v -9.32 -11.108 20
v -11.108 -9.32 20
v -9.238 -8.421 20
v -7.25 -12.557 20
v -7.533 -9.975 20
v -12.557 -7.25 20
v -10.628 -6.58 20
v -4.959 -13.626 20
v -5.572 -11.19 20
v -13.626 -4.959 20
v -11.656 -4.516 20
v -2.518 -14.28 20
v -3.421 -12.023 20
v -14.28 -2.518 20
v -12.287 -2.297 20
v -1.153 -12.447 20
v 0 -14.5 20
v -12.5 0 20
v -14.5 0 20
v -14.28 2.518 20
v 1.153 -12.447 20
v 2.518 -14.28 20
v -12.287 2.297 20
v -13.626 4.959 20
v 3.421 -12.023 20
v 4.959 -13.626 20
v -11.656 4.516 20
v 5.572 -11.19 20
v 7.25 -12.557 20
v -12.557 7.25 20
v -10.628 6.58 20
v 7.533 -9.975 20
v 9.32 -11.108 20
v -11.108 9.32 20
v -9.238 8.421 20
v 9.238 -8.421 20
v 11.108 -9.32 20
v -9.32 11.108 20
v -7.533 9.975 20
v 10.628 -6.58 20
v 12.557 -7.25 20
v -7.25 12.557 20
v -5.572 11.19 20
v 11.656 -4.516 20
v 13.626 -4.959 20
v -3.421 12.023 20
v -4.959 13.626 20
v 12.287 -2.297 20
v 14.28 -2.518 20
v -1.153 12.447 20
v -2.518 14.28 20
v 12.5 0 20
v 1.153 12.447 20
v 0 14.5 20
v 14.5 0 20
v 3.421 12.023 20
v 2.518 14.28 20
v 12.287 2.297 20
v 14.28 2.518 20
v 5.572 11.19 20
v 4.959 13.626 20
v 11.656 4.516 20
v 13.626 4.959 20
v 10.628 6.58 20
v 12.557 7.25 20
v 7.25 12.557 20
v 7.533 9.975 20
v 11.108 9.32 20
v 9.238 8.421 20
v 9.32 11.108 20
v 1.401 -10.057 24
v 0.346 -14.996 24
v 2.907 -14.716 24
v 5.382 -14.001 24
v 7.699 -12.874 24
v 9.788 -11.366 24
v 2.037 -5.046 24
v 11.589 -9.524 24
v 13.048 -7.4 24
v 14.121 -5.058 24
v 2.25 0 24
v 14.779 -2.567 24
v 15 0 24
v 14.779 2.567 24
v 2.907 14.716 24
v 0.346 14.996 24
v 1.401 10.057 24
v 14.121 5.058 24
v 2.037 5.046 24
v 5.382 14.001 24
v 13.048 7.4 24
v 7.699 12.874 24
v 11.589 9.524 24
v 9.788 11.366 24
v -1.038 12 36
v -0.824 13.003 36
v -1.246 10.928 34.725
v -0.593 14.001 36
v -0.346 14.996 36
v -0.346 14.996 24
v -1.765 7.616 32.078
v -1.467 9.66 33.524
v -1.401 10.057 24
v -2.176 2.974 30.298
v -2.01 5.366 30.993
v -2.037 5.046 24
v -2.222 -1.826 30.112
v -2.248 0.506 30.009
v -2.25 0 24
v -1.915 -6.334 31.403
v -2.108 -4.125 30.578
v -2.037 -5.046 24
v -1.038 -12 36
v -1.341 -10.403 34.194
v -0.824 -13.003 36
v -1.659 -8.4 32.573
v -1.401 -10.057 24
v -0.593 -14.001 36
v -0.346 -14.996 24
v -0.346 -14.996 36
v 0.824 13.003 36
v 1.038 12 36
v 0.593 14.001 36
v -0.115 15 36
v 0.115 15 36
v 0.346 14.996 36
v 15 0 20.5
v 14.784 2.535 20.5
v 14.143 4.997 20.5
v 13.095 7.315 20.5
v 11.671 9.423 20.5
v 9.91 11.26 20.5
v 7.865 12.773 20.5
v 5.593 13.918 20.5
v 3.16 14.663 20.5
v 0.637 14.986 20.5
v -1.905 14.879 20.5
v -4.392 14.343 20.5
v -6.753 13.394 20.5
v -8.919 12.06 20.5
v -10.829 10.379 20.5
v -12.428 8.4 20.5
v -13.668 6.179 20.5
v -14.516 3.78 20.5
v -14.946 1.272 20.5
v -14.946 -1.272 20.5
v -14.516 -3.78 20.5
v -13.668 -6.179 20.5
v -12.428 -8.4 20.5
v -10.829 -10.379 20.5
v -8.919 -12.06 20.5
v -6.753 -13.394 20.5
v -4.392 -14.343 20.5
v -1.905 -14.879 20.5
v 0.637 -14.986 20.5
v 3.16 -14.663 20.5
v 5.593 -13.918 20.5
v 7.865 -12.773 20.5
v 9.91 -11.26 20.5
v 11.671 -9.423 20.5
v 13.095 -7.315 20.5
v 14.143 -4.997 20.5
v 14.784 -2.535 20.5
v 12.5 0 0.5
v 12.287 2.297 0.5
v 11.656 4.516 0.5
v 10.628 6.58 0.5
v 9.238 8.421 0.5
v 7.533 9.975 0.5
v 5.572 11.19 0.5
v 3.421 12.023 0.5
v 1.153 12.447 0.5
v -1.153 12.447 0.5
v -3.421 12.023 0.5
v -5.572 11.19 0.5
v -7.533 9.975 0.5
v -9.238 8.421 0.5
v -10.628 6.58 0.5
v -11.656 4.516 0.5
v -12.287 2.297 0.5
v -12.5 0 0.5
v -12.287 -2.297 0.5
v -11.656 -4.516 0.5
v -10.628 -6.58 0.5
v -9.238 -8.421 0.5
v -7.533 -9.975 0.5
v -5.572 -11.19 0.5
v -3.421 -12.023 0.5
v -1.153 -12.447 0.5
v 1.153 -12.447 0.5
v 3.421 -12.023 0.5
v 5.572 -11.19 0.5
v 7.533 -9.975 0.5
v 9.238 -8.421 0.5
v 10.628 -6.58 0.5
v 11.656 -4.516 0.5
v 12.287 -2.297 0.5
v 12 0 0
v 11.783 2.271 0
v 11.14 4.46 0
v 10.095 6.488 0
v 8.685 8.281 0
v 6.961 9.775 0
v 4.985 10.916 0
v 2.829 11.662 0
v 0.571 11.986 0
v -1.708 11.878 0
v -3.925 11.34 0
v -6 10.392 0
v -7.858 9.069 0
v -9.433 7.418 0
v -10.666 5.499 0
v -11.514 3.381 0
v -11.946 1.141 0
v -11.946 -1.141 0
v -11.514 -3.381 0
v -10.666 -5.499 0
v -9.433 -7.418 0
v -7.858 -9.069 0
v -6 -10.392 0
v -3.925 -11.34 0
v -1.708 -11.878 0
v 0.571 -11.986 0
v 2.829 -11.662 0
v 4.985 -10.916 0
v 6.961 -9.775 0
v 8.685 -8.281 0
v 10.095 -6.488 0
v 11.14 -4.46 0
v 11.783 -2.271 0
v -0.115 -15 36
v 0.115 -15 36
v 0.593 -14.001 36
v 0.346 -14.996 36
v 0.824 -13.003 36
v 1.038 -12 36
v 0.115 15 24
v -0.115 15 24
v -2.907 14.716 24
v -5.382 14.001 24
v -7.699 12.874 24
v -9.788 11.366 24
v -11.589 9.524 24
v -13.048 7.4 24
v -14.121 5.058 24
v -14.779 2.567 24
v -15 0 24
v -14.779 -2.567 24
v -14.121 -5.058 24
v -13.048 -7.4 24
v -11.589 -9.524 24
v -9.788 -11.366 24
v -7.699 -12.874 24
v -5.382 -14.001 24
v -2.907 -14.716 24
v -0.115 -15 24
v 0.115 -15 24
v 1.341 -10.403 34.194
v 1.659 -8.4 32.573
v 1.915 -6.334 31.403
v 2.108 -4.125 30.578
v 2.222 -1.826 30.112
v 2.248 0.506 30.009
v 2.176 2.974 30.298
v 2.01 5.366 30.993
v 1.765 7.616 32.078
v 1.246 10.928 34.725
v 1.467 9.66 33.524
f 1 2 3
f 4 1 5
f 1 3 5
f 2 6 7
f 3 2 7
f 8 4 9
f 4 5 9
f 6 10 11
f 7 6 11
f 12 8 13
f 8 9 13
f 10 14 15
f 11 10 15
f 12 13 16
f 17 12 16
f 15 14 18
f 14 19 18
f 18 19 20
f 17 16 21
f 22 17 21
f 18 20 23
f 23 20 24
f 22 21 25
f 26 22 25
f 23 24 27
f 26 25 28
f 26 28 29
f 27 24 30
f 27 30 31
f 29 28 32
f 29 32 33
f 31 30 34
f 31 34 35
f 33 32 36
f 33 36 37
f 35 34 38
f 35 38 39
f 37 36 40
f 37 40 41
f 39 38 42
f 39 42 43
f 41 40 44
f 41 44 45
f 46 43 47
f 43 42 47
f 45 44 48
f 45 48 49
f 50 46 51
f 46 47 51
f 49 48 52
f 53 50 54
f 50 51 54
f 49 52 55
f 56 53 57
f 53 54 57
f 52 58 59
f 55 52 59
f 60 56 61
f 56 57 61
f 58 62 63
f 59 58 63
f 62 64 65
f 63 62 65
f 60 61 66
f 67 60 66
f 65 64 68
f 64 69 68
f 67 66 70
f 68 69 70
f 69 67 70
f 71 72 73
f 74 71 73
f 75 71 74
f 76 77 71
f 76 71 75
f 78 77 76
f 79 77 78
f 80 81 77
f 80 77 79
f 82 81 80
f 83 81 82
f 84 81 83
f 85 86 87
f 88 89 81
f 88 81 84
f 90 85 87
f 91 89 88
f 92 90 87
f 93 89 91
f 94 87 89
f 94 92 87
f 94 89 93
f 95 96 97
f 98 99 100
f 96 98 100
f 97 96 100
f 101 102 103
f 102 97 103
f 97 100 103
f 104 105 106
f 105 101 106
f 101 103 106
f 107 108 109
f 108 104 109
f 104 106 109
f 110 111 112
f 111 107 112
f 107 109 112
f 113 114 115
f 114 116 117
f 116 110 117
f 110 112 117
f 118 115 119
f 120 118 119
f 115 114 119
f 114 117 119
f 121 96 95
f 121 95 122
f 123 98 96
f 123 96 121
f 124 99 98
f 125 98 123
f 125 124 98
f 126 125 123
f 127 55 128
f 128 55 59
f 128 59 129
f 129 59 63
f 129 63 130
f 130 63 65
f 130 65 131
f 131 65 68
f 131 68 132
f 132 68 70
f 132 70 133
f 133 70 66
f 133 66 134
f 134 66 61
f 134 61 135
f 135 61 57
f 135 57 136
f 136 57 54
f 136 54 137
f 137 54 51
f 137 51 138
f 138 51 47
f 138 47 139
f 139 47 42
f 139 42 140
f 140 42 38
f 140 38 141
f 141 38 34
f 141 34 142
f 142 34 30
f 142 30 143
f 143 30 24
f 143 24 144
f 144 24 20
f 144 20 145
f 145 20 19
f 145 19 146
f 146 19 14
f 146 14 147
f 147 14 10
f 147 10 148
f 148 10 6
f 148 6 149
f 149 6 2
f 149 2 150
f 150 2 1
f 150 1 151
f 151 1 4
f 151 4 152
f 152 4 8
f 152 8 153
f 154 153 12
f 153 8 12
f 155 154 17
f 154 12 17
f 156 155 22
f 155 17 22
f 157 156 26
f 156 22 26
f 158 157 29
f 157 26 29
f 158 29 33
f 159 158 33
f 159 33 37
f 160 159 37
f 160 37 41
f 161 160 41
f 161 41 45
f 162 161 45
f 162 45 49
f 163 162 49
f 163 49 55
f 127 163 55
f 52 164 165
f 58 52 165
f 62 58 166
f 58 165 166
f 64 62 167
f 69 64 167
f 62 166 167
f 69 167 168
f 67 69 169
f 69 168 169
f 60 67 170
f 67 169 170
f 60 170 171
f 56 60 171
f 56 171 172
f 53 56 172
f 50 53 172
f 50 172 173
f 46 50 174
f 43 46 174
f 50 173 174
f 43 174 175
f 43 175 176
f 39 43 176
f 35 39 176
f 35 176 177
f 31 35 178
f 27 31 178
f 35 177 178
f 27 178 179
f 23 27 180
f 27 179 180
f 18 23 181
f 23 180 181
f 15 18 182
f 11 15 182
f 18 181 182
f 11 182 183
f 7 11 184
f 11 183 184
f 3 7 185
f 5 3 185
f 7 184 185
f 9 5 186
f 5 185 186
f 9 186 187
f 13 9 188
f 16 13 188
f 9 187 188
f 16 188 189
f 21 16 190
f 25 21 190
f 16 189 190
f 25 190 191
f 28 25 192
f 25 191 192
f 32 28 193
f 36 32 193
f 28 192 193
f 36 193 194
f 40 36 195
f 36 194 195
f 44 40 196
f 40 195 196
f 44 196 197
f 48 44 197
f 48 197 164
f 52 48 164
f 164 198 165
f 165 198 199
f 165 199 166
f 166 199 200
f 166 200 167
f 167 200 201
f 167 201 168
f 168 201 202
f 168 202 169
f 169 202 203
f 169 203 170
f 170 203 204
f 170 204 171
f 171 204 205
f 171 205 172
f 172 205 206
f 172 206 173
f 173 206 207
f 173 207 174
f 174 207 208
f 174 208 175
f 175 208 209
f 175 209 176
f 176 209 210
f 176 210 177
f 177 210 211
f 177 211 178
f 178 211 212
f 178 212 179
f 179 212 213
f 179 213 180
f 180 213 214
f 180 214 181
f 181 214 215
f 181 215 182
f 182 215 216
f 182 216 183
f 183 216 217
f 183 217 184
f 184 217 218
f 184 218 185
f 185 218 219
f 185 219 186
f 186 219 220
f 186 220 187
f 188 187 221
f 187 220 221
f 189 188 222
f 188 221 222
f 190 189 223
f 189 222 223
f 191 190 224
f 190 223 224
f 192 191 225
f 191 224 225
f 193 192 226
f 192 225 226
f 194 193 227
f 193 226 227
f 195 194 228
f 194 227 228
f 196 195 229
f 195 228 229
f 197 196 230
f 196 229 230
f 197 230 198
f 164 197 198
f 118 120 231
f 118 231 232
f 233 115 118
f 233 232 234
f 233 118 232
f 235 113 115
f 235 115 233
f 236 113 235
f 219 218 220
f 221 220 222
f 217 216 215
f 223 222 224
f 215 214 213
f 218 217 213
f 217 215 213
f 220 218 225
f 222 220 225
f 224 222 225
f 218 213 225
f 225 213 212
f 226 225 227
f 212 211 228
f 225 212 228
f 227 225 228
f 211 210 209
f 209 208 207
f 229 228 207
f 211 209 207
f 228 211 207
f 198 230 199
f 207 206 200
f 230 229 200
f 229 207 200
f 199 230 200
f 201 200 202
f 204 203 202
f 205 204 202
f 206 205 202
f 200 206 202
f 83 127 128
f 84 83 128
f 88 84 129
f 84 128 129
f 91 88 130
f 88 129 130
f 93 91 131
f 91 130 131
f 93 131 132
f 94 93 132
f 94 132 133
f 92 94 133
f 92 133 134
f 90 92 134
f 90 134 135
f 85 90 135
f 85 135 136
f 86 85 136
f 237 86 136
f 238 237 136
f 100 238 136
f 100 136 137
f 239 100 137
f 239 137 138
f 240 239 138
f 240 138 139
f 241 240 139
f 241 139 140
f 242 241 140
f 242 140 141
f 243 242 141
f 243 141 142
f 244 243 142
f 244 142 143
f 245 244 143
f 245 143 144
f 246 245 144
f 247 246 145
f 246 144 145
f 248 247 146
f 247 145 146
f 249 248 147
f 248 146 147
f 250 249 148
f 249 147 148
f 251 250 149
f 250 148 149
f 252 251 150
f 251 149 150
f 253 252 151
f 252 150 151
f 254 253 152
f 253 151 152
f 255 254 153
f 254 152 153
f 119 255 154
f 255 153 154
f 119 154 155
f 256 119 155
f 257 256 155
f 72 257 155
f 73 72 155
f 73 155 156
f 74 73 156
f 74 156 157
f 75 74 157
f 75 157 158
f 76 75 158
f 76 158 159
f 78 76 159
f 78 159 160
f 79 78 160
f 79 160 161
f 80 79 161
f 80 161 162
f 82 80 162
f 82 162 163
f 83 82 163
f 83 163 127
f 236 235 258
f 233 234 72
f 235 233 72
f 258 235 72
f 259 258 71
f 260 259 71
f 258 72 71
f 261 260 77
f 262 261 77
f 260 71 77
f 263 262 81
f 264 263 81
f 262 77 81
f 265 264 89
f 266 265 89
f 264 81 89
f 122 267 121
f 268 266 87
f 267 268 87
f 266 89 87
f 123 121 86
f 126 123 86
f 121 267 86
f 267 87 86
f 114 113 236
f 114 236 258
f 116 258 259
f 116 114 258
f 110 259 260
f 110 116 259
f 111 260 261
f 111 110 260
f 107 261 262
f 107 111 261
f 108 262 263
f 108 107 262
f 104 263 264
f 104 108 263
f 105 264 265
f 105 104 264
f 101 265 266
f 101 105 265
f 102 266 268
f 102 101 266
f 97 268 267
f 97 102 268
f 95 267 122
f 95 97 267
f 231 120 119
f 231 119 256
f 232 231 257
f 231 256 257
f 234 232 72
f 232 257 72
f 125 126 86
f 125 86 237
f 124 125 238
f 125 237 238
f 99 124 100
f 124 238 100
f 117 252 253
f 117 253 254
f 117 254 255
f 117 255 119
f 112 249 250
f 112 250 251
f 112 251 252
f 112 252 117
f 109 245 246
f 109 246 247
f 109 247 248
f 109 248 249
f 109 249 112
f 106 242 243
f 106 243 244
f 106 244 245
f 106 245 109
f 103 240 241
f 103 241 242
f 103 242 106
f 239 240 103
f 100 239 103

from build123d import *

# Parameters (mm, degrees)
F0_R          = 12.5
F1_DEPTH      = 20
F2_R          = 15
F3_DEPTH      = 4
F5_DEPTH      = 12
F7_DEPTH      = 7.4
F7_DEPTH_BACK = 5.4
F8_SIZE       = 0.5


with BuildPart() as f1:
    # F0 (on Top) → F1 (new body)
    with BuildSketch(Plane.XY):
        Circle(F0_R)
    extrude(amount=F1_DEPTH)

    # F2 (on face) → F3 (join)
    with BuildSketch(Plane.XY.offset(20)):
        Circle(F2_R)
    extrude(amount=F3_DEPTH)

    # F4 (on face) → F5 (join)
    with BuildSketch(Plane.XY.offset(24)):
        with BuildLine():
            ThreePointArc((-0.345779, 14.996014), (-2.25, 0), (-0.345779, -14.996014))
            ThreePointArc((-0.345779, -14.996014), (0, -15), (0.345779, -14.996014))
            ThreePointArc((0.345779, -14.996014), (2.25, 0), (0.345779, 14.996014))
            ThreePointArc((0.345779, 14.996014), (0, 15), (-0.345779, 14.996014))
        make_face()
    extrude(amount=F5_DEPTH)

    # F6 (on Right) → F7 (cut, two sides)
    with BuildSketch(Plane.YZ) as f7_sk:
        with BuildLine():
            Line((-12, 37), (-12, 36))
            ThreePointArc((-12, 36), (0, 30), (12, 36))
            Line((12, 36), (12, 37))
            Line((12, 37), (-12, 37))
        make_face()
    extrude(amount=F7_DEPTH, mode=Mode.SUBTRACT)
    extrude(f7_sk.sketch, amount=-F7_DEPTH_BACK, mode=Mode.SUBTRACT)

    # F8
    f8_edges = [f1.edges().sort_by_distance(p)[0] for p in [
        (-12.5, 0, 0),
        (-15, 0, 20),
    ]]
    chamfer(f8_edges, length=F8_SIZE)


solid = f1.part
